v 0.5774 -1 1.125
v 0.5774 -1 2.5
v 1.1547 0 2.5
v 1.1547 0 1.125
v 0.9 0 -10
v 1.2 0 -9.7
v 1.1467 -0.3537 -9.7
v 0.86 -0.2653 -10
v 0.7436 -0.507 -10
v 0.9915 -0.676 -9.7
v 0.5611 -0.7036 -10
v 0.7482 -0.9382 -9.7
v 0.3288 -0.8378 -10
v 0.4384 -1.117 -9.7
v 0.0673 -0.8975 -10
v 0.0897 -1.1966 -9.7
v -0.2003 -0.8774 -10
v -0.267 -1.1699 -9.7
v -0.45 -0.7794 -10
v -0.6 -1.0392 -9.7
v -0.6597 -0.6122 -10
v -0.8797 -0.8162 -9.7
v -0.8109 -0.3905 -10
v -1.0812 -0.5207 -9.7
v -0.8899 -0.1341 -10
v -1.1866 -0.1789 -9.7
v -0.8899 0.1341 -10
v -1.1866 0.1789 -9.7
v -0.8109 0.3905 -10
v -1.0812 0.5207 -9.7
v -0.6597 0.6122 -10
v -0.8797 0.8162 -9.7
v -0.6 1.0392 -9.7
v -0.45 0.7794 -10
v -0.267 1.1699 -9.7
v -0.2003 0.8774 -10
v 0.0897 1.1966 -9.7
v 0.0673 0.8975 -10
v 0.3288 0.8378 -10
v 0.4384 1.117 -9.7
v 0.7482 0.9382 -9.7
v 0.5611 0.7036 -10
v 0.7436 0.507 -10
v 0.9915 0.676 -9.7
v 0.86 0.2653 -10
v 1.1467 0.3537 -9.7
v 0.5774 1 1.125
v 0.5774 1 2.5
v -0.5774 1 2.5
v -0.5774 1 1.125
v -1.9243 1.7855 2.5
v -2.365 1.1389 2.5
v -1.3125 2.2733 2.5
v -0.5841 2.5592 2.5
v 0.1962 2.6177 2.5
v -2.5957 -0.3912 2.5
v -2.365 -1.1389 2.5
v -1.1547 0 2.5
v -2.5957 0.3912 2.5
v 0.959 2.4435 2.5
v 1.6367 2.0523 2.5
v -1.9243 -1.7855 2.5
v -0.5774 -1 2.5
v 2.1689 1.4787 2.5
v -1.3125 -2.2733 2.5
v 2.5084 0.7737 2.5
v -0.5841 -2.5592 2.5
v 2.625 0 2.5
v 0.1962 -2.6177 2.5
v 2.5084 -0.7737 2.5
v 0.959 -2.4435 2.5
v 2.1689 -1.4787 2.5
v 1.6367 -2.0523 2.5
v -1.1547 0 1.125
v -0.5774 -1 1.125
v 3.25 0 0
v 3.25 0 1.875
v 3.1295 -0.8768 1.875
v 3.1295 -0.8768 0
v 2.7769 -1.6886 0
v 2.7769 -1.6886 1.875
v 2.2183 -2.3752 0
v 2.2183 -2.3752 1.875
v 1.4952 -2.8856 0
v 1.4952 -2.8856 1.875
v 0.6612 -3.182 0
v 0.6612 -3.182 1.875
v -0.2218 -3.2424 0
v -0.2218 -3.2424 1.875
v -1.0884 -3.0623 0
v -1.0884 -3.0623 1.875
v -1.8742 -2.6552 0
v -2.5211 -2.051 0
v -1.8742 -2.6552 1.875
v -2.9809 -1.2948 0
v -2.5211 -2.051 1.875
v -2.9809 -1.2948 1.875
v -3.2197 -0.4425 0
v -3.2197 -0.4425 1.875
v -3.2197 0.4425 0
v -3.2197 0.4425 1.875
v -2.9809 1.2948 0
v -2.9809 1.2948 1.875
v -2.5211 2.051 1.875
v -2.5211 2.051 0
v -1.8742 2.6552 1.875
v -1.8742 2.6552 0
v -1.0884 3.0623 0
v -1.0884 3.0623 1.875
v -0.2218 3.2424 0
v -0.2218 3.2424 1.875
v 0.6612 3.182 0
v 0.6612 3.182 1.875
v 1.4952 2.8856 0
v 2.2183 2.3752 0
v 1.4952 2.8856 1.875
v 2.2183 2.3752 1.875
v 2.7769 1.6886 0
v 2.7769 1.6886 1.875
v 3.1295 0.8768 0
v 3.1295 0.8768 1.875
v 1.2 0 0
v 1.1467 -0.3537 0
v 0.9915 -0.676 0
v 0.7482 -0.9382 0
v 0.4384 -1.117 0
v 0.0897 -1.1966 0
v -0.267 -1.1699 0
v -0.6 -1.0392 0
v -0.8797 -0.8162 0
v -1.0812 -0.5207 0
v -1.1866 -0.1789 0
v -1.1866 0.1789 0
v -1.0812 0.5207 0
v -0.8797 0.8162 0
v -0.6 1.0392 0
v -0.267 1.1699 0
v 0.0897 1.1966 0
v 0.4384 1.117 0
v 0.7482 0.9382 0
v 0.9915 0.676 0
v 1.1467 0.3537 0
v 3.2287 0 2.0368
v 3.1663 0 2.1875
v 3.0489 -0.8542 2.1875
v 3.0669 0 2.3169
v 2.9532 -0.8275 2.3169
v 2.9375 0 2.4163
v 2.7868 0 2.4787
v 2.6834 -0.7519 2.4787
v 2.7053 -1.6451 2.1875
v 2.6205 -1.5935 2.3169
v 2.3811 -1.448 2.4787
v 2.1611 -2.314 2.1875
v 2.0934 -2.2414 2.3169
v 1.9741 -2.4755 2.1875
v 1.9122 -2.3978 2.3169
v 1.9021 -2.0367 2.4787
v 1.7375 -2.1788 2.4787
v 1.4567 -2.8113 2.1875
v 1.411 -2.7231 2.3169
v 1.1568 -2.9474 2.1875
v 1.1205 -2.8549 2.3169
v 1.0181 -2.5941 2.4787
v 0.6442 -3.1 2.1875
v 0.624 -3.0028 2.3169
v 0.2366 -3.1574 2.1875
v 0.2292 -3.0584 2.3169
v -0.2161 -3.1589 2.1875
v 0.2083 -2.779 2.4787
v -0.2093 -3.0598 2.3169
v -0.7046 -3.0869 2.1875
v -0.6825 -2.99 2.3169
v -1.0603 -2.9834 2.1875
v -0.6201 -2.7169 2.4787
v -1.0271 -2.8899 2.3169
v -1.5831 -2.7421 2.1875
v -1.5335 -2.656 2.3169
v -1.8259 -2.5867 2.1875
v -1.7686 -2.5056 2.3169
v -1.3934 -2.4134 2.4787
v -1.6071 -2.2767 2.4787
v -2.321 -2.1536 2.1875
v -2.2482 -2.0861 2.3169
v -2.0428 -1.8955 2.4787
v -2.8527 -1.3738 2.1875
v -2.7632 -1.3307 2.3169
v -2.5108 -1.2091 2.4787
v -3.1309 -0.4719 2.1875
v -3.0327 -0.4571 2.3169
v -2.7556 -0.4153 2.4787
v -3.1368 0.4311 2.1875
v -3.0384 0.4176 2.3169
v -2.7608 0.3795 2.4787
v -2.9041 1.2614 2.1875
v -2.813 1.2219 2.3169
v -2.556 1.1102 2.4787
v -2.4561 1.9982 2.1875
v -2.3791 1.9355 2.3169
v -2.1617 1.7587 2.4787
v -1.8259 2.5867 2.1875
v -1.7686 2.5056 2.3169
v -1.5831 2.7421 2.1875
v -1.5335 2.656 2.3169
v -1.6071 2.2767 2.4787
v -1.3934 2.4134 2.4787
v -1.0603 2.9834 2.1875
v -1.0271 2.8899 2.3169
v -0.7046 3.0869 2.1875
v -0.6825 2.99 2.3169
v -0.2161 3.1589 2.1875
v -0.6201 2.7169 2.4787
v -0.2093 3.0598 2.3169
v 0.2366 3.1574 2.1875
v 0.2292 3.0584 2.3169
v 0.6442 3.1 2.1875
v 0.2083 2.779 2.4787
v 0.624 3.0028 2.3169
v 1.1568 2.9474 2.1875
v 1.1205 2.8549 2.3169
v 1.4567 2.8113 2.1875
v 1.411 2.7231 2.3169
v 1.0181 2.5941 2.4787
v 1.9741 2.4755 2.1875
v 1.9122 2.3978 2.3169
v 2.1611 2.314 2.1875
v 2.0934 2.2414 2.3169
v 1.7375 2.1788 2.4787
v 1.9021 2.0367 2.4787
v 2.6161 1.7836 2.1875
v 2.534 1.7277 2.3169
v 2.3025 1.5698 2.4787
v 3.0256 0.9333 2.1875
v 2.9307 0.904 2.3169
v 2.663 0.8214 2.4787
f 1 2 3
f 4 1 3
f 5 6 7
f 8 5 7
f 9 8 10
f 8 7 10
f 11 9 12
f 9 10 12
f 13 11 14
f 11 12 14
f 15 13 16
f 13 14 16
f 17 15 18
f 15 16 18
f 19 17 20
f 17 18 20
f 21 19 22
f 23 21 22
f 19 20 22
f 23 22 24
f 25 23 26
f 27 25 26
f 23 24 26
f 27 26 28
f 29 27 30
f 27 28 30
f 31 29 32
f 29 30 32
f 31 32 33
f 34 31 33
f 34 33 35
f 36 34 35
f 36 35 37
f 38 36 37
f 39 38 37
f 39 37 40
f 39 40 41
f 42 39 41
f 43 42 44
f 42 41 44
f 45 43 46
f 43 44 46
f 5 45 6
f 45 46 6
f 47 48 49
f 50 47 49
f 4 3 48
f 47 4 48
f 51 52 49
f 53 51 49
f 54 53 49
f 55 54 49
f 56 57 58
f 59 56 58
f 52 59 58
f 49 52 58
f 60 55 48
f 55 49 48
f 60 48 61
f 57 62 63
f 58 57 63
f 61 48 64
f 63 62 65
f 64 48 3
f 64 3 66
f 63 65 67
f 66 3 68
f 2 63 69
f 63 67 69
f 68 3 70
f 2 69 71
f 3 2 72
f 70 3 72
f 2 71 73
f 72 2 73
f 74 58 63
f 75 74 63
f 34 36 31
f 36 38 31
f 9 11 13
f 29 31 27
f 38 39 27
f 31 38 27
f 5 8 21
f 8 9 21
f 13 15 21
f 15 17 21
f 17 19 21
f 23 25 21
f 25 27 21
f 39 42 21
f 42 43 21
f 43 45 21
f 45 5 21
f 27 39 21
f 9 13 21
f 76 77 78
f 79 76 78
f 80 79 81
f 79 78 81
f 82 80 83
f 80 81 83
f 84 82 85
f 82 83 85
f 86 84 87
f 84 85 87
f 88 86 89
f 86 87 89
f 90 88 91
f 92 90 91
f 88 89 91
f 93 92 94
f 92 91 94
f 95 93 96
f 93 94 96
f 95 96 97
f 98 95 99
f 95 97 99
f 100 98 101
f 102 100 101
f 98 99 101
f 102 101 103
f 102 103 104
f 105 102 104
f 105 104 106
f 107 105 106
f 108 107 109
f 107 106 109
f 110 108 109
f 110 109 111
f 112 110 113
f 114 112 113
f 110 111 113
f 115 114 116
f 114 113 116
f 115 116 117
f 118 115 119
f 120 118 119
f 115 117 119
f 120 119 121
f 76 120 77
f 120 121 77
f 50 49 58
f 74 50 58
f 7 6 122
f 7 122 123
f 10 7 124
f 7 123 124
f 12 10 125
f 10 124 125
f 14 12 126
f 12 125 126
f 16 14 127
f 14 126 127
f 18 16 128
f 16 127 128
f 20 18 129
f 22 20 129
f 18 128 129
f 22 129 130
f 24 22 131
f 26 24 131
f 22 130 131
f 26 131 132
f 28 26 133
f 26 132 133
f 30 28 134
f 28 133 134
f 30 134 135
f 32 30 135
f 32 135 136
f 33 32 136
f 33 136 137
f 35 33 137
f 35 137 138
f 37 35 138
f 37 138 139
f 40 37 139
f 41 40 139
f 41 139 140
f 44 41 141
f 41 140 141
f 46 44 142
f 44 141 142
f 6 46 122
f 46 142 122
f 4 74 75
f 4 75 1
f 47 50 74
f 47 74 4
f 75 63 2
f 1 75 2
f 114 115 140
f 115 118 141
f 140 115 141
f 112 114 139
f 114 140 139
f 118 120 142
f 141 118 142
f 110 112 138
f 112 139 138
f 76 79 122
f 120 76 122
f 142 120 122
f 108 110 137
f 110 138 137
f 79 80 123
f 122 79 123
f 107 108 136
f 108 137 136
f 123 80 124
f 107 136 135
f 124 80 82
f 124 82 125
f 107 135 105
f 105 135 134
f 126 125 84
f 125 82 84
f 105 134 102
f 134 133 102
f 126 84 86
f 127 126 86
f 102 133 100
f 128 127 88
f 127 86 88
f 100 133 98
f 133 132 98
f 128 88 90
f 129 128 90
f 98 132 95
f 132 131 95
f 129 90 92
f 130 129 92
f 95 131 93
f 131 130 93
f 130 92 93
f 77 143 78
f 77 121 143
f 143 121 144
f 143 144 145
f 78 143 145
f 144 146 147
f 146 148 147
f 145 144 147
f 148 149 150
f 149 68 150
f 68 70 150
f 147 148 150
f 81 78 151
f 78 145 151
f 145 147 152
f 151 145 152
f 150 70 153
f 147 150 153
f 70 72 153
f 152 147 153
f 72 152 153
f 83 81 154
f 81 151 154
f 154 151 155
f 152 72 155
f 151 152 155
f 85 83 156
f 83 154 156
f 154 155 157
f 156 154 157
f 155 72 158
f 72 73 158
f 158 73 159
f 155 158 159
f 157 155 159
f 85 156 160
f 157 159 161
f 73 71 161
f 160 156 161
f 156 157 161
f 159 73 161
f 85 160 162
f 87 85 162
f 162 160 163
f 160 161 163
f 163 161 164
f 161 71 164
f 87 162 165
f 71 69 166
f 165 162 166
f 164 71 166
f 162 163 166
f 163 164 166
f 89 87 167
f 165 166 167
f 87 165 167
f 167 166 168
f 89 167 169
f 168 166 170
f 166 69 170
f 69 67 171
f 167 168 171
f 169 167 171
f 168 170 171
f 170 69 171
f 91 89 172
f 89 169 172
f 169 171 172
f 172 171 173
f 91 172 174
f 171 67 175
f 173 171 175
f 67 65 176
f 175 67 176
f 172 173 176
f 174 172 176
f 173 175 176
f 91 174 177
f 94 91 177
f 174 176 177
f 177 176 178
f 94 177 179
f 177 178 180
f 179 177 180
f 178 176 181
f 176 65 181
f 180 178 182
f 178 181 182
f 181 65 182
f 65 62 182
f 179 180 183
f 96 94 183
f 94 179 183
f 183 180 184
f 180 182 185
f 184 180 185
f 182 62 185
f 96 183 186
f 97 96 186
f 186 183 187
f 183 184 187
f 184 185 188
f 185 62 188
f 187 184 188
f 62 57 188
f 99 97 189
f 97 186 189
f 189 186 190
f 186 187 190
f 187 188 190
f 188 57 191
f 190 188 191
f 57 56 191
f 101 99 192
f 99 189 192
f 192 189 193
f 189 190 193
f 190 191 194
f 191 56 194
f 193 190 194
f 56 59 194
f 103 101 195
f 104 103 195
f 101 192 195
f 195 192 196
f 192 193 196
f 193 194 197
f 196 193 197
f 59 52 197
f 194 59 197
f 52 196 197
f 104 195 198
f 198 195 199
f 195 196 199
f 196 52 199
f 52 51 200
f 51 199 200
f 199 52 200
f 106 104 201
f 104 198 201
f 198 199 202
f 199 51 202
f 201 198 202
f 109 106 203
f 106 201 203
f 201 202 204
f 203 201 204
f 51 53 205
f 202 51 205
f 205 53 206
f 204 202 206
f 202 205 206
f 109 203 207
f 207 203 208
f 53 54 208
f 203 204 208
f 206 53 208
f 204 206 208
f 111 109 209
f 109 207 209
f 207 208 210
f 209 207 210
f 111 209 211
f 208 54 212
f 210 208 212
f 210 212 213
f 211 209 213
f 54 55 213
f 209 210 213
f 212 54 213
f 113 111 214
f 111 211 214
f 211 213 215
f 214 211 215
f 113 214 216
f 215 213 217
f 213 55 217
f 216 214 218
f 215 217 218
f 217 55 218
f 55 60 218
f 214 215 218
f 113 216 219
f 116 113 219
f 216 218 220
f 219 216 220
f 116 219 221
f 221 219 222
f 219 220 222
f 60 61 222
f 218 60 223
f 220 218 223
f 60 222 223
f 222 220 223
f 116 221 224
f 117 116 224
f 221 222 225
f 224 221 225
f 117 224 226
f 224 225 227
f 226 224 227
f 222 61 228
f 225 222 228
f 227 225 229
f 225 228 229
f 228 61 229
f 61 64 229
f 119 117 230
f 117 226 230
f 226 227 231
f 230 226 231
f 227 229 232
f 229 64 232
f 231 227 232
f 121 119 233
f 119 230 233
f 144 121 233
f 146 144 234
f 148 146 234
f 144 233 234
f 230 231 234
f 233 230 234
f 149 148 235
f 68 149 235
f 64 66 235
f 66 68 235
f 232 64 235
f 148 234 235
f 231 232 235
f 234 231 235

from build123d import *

# Parameters (mm, degrees)
SHANK_TIP_CHAMFER_SIZE = 0.3
PAN_HEAD_ROUND_R       = 0.625
HEX_DRIVE_CUT_DEPTH    = 1.375


with BuildPart() as part:
    # Screw Section → Screw Blank Revolve (revolve)
    with BuildSketch(Plane(origin=(0, 0, 0), x_dir=(1, 0, 0), z_dir=(0, 1, 0))):
        Polygon((0, 10), (1.2, 10), (1.2, 0), (3.25, 0), (3.25, -2.5), (0, -2.5), align=None)
    revolve(axis=Axis((0, 0, 10.123), (0, 0, -1)))

    # Shank Tip Chamfer
    shank_tip_chamfer_edges = [part.edges().sort_by_distance(p)[0] for p in [
        (-1.2, 0, -10),
    ]]
    chamfer(shank_tip_chamfer_edges, length=SHANK_TIP_CHAMFER_SIZE)

    # Pan Head Round
    pan_head_round_edges = [part.edges().sort_by_distance(p)[0] for p in [
        (-3.25, 0, 2.5),
    ]]
    fillet(pan_head_round_edges, radius=PAN_HEAD_ROUND_R)

    # Hex Drive Sketch → Hex Drive Cut (cut)
    with BuildSketch(Plane.XY.offset(2.5)):
        Polygon((1.154700538, 0), (0.577350269, 1), (-0.577350269, 1), (-1.154700538, 0), (-0.577350269, -1), (0.577350269, -1), align=None)
    extrude(amount=-HEX_DRIVE_CUT_DEPTH, mode=Mode.SUBTRACT)


solid = part.part
